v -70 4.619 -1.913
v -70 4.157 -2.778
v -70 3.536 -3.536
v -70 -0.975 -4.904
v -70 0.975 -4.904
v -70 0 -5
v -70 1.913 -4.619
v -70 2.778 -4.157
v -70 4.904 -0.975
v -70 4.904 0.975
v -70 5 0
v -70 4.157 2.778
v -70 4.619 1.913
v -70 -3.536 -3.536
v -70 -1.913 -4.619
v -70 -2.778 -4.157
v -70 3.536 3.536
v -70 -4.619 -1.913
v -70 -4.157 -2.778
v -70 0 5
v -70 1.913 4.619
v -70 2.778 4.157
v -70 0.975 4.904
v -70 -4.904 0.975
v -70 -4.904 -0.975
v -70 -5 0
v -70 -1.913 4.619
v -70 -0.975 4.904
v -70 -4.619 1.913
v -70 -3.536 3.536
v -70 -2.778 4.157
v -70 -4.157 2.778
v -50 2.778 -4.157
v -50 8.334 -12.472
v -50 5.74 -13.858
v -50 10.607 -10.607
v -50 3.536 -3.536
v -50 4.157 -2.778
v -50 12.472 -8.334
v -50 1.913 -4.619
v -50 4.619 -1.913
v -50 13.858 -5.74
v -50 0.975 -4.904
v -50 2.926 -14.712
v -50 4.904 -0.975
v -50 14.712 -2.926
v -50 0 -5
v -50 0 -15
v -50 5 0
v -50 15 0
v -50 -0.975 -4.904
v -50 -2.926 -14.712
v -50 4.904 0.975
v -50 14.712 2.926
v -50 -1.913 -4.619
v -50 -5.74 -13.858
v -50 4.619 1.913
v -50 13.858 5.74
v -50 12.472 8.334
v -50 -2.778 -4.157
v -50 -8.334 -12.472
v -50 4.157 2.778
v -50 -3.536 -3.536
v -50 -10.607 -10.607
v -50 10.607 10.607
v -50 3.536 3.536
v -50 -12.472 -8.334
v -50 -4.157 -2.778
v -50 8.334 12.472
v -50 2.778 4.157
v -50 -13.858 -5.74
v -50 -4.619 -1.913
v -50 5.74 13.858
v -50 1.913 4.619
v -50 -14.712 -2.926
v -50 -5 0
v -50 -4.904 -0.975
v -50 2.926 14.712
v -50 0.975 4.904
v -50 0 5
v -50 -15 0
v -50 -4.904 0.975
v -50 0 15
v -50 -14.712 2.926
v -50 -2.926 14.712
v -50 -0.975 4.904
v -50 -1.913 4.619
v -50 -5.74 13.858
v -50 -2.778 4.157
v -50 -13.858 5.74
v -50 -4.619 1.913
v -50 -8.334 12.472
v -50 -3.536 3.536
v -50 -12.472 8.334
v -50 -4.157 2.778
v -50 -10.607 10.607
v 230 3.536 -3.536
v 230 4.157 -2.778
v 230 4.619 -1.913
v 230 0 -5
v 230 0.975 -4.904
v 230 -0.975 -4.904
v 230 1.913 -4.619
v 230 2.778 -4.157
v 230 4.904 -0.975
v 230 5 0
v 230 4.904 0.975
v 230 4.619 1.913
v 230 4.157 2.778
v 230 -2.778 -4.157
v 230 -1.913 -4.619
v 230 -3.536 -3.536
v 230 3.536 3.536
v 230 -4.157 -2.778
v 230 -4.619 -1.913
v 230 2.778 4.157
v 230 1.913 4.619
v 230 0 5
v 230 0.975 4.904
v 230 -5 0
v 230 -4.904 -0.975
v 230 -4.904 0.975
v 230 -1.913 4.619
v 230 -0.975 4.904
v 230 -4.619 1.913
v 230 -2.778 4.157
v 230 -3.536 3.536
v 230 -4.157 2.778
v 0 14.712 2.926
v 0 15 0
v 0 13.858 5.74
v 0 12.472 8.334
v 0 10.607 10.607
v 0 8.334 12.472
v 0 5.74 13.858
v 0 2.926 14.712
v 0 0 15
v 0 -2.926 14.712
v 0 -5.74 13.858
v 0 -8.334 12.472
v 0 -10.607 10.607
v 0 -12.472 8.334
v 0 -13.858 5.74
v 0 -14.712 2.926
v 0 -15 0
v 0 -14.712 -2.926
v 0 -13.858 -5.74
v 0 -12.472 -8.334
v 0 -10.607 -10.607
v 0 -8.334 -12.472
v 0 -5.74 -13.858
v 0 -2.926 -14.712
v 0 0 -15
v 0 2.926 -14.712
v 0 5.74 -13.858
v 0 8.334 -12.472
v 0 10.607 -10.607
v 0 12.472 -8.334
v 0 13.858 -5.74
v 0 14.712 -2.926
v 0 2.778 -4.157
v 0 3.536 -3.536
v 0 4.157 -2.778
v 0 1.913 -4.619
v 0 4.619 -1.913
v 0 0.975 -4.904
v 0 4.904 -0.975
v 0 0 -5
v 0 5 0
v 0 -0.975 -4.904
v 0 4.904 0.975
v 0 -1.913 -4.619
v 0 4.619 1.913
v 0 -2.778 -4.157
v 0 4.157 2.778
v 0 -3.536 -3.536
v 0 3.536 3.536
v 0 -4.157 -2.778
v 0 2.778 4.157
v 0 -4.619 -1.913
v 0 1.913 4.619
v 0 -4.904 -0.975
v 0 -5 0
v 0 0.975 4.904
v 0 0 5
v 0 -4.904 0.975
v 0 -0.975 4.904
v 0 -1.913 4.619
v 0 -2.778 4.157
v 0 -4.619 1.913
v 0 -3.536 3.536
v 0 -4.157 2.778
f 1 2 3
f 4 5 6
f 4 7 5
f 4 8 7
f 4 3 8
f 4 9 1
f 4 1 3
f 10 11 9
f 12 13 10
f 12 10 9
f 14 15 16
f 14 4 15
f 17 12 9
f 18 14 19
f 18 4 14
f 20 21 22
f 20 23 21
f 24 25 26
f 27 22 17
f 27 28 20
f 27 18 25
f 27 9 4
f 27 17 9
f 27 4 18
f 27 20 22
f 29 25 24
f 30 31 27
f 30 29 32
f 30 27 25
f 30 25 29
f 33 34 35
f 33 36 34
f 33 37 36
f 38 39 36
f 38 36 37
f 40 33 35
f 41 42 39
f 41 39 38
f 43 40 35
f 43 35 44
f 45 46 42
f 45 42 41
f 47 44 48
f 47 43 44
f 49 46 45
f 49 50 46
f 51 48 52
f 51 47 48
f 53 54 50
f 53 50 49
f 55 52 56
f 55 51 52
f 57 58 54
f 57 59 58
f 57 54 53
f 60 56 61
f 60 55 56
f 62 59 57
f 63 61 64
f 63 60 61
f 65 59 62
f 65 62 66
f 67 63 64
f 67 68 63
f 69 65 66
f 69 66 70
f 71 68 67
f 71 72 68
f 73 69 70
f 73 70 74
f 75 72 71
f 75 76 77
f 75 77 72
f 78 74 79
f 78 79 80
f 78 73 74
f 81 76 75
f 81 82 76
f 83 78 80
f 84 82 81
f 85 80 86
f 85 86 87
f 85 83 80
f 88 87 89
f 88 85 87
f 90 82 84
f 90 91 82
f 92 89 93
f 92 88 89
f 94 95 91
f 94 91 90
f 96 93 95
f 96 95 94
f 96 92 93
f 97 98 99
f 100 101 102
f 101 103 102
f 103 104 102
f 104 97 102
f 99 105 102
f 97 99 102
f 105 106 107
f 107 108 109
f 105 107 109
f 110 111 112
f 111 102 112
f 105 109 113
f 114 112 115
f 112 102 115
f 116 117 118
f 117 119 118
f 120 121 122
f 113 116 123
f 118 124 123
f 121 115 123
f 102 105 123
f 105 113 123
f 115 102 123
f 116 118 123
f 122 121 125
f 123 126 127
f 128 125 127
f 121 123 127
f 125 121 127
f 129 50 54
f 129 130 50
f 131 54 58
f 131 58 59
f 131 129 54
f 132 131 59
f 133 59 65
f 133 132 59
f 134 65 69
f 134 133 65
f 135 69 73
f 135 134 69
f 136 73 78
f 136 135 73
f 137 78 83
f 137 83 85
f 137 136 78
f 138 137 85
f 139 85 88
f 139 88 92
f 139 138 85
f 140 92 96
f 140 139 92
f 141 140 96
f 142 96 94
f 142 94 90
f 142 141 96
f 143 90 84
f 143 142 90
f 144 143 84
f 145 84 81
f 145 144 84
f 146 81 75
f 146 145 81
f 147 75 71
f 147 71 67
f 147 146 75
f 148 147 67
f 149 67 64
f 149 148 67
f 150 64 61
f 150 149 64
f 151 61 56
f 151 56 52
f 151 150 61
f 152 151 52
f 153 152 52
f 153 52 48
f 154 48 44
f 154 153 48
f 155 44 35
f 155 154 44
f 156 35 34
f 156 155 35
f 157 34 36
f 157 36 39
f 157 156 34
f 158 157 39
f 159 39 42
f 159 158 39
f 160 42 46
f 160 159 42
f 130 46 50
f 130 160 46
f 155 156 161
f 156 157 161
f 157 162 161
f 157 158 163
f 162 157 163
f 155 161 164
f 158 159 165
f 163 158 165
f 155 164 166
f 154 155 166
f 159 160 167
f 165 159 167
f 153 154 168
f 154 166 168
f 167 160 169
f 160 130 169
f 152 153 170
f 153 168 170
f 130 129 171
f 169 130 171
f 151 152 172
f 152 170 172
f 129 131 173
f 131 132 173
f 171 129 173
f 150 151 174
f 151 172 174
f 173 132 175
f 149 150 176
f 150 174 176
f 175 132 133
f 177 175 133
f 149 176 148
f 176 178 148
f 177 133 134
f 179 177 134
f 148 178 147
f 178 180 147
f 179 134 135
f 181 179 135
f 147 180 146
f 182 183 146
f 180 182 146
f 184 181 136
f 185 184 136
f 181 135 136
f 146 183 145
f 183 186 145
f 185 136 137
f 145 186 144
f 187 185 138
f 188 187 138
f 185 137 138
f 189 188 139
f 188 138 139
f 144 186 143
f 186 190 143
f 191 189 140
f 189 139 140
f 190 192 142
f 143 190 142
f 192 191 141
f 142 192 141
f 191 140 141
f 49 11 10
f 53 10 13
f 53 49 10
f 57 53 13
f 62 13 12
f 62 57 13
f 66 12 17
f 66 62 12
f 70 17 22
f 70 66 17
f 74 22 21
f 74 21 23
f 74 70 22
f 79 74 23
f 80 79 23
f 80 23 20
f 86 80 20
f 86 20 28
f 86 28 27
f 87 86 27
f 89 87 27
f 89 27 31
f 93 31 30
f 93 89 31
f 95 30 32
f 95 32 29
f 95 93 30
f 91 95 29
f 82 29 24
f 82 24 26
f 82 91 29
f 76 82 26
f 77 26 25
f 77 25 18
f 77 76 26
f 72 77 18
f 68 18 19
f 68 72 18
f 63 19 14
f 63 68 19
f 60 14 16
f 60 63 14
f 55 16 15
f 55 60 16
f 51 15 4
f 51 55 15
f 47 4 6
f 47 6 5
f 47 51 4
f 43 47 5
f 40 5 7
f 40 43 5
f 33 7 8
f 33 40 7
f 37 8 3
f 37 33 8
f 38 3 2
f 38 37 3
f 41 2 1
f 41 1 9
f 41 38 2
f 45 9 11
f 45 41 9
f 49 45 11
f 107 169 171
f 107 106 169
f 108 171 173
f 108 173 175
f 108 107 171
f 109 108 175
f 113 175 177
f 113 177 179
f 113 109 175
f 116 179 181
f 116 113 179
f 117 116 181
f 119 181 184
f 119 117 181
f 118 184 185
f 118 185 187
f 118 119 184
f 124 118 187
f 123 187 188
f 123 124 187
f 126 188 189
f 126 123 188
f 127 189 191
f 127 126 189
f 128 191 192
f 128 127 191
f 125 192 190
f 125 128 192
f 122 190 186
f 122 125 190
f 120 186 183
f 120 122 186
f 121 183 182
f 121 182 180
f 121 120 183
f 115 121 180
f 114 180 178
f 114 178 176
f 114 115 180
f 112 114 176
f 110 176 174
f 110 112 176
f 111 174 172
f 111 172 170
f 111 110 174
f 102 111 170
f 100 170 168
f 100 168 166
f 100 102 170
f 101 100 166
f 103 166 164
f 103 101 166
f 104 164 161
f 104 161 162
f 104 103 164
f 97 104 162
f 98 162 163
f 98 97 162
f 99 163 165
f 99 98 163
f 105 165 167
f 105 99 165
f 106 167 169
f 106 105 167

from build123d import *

# Parameters (mm, degrees)
F0_W   = 20
F0_H   = 5
F0_W_2 = 50
F0_H_2 = 10
F0_W_3 = 230


with BuildPart() as f1:
    # F0 (on Top) → F1 (revolve)
    with BuildSketch(Plane.XY):
        with Locations((-60, 2.5)):
            Rectangle(F0_W, F0_H)
        with Locations((-25, 10)):
            Rectangle(F0_W_2, F0_H_2)
        with Locations((-25, 2.5)):
            Rectangle(F0_W_2, F0_H)
        with Locations((115, 2.5)):
            Rectangle(F0_W_3, F0_H)
    revolve(axis=Axis((80, 0, 0), (1, 0, 0)))


solid = f1.part
